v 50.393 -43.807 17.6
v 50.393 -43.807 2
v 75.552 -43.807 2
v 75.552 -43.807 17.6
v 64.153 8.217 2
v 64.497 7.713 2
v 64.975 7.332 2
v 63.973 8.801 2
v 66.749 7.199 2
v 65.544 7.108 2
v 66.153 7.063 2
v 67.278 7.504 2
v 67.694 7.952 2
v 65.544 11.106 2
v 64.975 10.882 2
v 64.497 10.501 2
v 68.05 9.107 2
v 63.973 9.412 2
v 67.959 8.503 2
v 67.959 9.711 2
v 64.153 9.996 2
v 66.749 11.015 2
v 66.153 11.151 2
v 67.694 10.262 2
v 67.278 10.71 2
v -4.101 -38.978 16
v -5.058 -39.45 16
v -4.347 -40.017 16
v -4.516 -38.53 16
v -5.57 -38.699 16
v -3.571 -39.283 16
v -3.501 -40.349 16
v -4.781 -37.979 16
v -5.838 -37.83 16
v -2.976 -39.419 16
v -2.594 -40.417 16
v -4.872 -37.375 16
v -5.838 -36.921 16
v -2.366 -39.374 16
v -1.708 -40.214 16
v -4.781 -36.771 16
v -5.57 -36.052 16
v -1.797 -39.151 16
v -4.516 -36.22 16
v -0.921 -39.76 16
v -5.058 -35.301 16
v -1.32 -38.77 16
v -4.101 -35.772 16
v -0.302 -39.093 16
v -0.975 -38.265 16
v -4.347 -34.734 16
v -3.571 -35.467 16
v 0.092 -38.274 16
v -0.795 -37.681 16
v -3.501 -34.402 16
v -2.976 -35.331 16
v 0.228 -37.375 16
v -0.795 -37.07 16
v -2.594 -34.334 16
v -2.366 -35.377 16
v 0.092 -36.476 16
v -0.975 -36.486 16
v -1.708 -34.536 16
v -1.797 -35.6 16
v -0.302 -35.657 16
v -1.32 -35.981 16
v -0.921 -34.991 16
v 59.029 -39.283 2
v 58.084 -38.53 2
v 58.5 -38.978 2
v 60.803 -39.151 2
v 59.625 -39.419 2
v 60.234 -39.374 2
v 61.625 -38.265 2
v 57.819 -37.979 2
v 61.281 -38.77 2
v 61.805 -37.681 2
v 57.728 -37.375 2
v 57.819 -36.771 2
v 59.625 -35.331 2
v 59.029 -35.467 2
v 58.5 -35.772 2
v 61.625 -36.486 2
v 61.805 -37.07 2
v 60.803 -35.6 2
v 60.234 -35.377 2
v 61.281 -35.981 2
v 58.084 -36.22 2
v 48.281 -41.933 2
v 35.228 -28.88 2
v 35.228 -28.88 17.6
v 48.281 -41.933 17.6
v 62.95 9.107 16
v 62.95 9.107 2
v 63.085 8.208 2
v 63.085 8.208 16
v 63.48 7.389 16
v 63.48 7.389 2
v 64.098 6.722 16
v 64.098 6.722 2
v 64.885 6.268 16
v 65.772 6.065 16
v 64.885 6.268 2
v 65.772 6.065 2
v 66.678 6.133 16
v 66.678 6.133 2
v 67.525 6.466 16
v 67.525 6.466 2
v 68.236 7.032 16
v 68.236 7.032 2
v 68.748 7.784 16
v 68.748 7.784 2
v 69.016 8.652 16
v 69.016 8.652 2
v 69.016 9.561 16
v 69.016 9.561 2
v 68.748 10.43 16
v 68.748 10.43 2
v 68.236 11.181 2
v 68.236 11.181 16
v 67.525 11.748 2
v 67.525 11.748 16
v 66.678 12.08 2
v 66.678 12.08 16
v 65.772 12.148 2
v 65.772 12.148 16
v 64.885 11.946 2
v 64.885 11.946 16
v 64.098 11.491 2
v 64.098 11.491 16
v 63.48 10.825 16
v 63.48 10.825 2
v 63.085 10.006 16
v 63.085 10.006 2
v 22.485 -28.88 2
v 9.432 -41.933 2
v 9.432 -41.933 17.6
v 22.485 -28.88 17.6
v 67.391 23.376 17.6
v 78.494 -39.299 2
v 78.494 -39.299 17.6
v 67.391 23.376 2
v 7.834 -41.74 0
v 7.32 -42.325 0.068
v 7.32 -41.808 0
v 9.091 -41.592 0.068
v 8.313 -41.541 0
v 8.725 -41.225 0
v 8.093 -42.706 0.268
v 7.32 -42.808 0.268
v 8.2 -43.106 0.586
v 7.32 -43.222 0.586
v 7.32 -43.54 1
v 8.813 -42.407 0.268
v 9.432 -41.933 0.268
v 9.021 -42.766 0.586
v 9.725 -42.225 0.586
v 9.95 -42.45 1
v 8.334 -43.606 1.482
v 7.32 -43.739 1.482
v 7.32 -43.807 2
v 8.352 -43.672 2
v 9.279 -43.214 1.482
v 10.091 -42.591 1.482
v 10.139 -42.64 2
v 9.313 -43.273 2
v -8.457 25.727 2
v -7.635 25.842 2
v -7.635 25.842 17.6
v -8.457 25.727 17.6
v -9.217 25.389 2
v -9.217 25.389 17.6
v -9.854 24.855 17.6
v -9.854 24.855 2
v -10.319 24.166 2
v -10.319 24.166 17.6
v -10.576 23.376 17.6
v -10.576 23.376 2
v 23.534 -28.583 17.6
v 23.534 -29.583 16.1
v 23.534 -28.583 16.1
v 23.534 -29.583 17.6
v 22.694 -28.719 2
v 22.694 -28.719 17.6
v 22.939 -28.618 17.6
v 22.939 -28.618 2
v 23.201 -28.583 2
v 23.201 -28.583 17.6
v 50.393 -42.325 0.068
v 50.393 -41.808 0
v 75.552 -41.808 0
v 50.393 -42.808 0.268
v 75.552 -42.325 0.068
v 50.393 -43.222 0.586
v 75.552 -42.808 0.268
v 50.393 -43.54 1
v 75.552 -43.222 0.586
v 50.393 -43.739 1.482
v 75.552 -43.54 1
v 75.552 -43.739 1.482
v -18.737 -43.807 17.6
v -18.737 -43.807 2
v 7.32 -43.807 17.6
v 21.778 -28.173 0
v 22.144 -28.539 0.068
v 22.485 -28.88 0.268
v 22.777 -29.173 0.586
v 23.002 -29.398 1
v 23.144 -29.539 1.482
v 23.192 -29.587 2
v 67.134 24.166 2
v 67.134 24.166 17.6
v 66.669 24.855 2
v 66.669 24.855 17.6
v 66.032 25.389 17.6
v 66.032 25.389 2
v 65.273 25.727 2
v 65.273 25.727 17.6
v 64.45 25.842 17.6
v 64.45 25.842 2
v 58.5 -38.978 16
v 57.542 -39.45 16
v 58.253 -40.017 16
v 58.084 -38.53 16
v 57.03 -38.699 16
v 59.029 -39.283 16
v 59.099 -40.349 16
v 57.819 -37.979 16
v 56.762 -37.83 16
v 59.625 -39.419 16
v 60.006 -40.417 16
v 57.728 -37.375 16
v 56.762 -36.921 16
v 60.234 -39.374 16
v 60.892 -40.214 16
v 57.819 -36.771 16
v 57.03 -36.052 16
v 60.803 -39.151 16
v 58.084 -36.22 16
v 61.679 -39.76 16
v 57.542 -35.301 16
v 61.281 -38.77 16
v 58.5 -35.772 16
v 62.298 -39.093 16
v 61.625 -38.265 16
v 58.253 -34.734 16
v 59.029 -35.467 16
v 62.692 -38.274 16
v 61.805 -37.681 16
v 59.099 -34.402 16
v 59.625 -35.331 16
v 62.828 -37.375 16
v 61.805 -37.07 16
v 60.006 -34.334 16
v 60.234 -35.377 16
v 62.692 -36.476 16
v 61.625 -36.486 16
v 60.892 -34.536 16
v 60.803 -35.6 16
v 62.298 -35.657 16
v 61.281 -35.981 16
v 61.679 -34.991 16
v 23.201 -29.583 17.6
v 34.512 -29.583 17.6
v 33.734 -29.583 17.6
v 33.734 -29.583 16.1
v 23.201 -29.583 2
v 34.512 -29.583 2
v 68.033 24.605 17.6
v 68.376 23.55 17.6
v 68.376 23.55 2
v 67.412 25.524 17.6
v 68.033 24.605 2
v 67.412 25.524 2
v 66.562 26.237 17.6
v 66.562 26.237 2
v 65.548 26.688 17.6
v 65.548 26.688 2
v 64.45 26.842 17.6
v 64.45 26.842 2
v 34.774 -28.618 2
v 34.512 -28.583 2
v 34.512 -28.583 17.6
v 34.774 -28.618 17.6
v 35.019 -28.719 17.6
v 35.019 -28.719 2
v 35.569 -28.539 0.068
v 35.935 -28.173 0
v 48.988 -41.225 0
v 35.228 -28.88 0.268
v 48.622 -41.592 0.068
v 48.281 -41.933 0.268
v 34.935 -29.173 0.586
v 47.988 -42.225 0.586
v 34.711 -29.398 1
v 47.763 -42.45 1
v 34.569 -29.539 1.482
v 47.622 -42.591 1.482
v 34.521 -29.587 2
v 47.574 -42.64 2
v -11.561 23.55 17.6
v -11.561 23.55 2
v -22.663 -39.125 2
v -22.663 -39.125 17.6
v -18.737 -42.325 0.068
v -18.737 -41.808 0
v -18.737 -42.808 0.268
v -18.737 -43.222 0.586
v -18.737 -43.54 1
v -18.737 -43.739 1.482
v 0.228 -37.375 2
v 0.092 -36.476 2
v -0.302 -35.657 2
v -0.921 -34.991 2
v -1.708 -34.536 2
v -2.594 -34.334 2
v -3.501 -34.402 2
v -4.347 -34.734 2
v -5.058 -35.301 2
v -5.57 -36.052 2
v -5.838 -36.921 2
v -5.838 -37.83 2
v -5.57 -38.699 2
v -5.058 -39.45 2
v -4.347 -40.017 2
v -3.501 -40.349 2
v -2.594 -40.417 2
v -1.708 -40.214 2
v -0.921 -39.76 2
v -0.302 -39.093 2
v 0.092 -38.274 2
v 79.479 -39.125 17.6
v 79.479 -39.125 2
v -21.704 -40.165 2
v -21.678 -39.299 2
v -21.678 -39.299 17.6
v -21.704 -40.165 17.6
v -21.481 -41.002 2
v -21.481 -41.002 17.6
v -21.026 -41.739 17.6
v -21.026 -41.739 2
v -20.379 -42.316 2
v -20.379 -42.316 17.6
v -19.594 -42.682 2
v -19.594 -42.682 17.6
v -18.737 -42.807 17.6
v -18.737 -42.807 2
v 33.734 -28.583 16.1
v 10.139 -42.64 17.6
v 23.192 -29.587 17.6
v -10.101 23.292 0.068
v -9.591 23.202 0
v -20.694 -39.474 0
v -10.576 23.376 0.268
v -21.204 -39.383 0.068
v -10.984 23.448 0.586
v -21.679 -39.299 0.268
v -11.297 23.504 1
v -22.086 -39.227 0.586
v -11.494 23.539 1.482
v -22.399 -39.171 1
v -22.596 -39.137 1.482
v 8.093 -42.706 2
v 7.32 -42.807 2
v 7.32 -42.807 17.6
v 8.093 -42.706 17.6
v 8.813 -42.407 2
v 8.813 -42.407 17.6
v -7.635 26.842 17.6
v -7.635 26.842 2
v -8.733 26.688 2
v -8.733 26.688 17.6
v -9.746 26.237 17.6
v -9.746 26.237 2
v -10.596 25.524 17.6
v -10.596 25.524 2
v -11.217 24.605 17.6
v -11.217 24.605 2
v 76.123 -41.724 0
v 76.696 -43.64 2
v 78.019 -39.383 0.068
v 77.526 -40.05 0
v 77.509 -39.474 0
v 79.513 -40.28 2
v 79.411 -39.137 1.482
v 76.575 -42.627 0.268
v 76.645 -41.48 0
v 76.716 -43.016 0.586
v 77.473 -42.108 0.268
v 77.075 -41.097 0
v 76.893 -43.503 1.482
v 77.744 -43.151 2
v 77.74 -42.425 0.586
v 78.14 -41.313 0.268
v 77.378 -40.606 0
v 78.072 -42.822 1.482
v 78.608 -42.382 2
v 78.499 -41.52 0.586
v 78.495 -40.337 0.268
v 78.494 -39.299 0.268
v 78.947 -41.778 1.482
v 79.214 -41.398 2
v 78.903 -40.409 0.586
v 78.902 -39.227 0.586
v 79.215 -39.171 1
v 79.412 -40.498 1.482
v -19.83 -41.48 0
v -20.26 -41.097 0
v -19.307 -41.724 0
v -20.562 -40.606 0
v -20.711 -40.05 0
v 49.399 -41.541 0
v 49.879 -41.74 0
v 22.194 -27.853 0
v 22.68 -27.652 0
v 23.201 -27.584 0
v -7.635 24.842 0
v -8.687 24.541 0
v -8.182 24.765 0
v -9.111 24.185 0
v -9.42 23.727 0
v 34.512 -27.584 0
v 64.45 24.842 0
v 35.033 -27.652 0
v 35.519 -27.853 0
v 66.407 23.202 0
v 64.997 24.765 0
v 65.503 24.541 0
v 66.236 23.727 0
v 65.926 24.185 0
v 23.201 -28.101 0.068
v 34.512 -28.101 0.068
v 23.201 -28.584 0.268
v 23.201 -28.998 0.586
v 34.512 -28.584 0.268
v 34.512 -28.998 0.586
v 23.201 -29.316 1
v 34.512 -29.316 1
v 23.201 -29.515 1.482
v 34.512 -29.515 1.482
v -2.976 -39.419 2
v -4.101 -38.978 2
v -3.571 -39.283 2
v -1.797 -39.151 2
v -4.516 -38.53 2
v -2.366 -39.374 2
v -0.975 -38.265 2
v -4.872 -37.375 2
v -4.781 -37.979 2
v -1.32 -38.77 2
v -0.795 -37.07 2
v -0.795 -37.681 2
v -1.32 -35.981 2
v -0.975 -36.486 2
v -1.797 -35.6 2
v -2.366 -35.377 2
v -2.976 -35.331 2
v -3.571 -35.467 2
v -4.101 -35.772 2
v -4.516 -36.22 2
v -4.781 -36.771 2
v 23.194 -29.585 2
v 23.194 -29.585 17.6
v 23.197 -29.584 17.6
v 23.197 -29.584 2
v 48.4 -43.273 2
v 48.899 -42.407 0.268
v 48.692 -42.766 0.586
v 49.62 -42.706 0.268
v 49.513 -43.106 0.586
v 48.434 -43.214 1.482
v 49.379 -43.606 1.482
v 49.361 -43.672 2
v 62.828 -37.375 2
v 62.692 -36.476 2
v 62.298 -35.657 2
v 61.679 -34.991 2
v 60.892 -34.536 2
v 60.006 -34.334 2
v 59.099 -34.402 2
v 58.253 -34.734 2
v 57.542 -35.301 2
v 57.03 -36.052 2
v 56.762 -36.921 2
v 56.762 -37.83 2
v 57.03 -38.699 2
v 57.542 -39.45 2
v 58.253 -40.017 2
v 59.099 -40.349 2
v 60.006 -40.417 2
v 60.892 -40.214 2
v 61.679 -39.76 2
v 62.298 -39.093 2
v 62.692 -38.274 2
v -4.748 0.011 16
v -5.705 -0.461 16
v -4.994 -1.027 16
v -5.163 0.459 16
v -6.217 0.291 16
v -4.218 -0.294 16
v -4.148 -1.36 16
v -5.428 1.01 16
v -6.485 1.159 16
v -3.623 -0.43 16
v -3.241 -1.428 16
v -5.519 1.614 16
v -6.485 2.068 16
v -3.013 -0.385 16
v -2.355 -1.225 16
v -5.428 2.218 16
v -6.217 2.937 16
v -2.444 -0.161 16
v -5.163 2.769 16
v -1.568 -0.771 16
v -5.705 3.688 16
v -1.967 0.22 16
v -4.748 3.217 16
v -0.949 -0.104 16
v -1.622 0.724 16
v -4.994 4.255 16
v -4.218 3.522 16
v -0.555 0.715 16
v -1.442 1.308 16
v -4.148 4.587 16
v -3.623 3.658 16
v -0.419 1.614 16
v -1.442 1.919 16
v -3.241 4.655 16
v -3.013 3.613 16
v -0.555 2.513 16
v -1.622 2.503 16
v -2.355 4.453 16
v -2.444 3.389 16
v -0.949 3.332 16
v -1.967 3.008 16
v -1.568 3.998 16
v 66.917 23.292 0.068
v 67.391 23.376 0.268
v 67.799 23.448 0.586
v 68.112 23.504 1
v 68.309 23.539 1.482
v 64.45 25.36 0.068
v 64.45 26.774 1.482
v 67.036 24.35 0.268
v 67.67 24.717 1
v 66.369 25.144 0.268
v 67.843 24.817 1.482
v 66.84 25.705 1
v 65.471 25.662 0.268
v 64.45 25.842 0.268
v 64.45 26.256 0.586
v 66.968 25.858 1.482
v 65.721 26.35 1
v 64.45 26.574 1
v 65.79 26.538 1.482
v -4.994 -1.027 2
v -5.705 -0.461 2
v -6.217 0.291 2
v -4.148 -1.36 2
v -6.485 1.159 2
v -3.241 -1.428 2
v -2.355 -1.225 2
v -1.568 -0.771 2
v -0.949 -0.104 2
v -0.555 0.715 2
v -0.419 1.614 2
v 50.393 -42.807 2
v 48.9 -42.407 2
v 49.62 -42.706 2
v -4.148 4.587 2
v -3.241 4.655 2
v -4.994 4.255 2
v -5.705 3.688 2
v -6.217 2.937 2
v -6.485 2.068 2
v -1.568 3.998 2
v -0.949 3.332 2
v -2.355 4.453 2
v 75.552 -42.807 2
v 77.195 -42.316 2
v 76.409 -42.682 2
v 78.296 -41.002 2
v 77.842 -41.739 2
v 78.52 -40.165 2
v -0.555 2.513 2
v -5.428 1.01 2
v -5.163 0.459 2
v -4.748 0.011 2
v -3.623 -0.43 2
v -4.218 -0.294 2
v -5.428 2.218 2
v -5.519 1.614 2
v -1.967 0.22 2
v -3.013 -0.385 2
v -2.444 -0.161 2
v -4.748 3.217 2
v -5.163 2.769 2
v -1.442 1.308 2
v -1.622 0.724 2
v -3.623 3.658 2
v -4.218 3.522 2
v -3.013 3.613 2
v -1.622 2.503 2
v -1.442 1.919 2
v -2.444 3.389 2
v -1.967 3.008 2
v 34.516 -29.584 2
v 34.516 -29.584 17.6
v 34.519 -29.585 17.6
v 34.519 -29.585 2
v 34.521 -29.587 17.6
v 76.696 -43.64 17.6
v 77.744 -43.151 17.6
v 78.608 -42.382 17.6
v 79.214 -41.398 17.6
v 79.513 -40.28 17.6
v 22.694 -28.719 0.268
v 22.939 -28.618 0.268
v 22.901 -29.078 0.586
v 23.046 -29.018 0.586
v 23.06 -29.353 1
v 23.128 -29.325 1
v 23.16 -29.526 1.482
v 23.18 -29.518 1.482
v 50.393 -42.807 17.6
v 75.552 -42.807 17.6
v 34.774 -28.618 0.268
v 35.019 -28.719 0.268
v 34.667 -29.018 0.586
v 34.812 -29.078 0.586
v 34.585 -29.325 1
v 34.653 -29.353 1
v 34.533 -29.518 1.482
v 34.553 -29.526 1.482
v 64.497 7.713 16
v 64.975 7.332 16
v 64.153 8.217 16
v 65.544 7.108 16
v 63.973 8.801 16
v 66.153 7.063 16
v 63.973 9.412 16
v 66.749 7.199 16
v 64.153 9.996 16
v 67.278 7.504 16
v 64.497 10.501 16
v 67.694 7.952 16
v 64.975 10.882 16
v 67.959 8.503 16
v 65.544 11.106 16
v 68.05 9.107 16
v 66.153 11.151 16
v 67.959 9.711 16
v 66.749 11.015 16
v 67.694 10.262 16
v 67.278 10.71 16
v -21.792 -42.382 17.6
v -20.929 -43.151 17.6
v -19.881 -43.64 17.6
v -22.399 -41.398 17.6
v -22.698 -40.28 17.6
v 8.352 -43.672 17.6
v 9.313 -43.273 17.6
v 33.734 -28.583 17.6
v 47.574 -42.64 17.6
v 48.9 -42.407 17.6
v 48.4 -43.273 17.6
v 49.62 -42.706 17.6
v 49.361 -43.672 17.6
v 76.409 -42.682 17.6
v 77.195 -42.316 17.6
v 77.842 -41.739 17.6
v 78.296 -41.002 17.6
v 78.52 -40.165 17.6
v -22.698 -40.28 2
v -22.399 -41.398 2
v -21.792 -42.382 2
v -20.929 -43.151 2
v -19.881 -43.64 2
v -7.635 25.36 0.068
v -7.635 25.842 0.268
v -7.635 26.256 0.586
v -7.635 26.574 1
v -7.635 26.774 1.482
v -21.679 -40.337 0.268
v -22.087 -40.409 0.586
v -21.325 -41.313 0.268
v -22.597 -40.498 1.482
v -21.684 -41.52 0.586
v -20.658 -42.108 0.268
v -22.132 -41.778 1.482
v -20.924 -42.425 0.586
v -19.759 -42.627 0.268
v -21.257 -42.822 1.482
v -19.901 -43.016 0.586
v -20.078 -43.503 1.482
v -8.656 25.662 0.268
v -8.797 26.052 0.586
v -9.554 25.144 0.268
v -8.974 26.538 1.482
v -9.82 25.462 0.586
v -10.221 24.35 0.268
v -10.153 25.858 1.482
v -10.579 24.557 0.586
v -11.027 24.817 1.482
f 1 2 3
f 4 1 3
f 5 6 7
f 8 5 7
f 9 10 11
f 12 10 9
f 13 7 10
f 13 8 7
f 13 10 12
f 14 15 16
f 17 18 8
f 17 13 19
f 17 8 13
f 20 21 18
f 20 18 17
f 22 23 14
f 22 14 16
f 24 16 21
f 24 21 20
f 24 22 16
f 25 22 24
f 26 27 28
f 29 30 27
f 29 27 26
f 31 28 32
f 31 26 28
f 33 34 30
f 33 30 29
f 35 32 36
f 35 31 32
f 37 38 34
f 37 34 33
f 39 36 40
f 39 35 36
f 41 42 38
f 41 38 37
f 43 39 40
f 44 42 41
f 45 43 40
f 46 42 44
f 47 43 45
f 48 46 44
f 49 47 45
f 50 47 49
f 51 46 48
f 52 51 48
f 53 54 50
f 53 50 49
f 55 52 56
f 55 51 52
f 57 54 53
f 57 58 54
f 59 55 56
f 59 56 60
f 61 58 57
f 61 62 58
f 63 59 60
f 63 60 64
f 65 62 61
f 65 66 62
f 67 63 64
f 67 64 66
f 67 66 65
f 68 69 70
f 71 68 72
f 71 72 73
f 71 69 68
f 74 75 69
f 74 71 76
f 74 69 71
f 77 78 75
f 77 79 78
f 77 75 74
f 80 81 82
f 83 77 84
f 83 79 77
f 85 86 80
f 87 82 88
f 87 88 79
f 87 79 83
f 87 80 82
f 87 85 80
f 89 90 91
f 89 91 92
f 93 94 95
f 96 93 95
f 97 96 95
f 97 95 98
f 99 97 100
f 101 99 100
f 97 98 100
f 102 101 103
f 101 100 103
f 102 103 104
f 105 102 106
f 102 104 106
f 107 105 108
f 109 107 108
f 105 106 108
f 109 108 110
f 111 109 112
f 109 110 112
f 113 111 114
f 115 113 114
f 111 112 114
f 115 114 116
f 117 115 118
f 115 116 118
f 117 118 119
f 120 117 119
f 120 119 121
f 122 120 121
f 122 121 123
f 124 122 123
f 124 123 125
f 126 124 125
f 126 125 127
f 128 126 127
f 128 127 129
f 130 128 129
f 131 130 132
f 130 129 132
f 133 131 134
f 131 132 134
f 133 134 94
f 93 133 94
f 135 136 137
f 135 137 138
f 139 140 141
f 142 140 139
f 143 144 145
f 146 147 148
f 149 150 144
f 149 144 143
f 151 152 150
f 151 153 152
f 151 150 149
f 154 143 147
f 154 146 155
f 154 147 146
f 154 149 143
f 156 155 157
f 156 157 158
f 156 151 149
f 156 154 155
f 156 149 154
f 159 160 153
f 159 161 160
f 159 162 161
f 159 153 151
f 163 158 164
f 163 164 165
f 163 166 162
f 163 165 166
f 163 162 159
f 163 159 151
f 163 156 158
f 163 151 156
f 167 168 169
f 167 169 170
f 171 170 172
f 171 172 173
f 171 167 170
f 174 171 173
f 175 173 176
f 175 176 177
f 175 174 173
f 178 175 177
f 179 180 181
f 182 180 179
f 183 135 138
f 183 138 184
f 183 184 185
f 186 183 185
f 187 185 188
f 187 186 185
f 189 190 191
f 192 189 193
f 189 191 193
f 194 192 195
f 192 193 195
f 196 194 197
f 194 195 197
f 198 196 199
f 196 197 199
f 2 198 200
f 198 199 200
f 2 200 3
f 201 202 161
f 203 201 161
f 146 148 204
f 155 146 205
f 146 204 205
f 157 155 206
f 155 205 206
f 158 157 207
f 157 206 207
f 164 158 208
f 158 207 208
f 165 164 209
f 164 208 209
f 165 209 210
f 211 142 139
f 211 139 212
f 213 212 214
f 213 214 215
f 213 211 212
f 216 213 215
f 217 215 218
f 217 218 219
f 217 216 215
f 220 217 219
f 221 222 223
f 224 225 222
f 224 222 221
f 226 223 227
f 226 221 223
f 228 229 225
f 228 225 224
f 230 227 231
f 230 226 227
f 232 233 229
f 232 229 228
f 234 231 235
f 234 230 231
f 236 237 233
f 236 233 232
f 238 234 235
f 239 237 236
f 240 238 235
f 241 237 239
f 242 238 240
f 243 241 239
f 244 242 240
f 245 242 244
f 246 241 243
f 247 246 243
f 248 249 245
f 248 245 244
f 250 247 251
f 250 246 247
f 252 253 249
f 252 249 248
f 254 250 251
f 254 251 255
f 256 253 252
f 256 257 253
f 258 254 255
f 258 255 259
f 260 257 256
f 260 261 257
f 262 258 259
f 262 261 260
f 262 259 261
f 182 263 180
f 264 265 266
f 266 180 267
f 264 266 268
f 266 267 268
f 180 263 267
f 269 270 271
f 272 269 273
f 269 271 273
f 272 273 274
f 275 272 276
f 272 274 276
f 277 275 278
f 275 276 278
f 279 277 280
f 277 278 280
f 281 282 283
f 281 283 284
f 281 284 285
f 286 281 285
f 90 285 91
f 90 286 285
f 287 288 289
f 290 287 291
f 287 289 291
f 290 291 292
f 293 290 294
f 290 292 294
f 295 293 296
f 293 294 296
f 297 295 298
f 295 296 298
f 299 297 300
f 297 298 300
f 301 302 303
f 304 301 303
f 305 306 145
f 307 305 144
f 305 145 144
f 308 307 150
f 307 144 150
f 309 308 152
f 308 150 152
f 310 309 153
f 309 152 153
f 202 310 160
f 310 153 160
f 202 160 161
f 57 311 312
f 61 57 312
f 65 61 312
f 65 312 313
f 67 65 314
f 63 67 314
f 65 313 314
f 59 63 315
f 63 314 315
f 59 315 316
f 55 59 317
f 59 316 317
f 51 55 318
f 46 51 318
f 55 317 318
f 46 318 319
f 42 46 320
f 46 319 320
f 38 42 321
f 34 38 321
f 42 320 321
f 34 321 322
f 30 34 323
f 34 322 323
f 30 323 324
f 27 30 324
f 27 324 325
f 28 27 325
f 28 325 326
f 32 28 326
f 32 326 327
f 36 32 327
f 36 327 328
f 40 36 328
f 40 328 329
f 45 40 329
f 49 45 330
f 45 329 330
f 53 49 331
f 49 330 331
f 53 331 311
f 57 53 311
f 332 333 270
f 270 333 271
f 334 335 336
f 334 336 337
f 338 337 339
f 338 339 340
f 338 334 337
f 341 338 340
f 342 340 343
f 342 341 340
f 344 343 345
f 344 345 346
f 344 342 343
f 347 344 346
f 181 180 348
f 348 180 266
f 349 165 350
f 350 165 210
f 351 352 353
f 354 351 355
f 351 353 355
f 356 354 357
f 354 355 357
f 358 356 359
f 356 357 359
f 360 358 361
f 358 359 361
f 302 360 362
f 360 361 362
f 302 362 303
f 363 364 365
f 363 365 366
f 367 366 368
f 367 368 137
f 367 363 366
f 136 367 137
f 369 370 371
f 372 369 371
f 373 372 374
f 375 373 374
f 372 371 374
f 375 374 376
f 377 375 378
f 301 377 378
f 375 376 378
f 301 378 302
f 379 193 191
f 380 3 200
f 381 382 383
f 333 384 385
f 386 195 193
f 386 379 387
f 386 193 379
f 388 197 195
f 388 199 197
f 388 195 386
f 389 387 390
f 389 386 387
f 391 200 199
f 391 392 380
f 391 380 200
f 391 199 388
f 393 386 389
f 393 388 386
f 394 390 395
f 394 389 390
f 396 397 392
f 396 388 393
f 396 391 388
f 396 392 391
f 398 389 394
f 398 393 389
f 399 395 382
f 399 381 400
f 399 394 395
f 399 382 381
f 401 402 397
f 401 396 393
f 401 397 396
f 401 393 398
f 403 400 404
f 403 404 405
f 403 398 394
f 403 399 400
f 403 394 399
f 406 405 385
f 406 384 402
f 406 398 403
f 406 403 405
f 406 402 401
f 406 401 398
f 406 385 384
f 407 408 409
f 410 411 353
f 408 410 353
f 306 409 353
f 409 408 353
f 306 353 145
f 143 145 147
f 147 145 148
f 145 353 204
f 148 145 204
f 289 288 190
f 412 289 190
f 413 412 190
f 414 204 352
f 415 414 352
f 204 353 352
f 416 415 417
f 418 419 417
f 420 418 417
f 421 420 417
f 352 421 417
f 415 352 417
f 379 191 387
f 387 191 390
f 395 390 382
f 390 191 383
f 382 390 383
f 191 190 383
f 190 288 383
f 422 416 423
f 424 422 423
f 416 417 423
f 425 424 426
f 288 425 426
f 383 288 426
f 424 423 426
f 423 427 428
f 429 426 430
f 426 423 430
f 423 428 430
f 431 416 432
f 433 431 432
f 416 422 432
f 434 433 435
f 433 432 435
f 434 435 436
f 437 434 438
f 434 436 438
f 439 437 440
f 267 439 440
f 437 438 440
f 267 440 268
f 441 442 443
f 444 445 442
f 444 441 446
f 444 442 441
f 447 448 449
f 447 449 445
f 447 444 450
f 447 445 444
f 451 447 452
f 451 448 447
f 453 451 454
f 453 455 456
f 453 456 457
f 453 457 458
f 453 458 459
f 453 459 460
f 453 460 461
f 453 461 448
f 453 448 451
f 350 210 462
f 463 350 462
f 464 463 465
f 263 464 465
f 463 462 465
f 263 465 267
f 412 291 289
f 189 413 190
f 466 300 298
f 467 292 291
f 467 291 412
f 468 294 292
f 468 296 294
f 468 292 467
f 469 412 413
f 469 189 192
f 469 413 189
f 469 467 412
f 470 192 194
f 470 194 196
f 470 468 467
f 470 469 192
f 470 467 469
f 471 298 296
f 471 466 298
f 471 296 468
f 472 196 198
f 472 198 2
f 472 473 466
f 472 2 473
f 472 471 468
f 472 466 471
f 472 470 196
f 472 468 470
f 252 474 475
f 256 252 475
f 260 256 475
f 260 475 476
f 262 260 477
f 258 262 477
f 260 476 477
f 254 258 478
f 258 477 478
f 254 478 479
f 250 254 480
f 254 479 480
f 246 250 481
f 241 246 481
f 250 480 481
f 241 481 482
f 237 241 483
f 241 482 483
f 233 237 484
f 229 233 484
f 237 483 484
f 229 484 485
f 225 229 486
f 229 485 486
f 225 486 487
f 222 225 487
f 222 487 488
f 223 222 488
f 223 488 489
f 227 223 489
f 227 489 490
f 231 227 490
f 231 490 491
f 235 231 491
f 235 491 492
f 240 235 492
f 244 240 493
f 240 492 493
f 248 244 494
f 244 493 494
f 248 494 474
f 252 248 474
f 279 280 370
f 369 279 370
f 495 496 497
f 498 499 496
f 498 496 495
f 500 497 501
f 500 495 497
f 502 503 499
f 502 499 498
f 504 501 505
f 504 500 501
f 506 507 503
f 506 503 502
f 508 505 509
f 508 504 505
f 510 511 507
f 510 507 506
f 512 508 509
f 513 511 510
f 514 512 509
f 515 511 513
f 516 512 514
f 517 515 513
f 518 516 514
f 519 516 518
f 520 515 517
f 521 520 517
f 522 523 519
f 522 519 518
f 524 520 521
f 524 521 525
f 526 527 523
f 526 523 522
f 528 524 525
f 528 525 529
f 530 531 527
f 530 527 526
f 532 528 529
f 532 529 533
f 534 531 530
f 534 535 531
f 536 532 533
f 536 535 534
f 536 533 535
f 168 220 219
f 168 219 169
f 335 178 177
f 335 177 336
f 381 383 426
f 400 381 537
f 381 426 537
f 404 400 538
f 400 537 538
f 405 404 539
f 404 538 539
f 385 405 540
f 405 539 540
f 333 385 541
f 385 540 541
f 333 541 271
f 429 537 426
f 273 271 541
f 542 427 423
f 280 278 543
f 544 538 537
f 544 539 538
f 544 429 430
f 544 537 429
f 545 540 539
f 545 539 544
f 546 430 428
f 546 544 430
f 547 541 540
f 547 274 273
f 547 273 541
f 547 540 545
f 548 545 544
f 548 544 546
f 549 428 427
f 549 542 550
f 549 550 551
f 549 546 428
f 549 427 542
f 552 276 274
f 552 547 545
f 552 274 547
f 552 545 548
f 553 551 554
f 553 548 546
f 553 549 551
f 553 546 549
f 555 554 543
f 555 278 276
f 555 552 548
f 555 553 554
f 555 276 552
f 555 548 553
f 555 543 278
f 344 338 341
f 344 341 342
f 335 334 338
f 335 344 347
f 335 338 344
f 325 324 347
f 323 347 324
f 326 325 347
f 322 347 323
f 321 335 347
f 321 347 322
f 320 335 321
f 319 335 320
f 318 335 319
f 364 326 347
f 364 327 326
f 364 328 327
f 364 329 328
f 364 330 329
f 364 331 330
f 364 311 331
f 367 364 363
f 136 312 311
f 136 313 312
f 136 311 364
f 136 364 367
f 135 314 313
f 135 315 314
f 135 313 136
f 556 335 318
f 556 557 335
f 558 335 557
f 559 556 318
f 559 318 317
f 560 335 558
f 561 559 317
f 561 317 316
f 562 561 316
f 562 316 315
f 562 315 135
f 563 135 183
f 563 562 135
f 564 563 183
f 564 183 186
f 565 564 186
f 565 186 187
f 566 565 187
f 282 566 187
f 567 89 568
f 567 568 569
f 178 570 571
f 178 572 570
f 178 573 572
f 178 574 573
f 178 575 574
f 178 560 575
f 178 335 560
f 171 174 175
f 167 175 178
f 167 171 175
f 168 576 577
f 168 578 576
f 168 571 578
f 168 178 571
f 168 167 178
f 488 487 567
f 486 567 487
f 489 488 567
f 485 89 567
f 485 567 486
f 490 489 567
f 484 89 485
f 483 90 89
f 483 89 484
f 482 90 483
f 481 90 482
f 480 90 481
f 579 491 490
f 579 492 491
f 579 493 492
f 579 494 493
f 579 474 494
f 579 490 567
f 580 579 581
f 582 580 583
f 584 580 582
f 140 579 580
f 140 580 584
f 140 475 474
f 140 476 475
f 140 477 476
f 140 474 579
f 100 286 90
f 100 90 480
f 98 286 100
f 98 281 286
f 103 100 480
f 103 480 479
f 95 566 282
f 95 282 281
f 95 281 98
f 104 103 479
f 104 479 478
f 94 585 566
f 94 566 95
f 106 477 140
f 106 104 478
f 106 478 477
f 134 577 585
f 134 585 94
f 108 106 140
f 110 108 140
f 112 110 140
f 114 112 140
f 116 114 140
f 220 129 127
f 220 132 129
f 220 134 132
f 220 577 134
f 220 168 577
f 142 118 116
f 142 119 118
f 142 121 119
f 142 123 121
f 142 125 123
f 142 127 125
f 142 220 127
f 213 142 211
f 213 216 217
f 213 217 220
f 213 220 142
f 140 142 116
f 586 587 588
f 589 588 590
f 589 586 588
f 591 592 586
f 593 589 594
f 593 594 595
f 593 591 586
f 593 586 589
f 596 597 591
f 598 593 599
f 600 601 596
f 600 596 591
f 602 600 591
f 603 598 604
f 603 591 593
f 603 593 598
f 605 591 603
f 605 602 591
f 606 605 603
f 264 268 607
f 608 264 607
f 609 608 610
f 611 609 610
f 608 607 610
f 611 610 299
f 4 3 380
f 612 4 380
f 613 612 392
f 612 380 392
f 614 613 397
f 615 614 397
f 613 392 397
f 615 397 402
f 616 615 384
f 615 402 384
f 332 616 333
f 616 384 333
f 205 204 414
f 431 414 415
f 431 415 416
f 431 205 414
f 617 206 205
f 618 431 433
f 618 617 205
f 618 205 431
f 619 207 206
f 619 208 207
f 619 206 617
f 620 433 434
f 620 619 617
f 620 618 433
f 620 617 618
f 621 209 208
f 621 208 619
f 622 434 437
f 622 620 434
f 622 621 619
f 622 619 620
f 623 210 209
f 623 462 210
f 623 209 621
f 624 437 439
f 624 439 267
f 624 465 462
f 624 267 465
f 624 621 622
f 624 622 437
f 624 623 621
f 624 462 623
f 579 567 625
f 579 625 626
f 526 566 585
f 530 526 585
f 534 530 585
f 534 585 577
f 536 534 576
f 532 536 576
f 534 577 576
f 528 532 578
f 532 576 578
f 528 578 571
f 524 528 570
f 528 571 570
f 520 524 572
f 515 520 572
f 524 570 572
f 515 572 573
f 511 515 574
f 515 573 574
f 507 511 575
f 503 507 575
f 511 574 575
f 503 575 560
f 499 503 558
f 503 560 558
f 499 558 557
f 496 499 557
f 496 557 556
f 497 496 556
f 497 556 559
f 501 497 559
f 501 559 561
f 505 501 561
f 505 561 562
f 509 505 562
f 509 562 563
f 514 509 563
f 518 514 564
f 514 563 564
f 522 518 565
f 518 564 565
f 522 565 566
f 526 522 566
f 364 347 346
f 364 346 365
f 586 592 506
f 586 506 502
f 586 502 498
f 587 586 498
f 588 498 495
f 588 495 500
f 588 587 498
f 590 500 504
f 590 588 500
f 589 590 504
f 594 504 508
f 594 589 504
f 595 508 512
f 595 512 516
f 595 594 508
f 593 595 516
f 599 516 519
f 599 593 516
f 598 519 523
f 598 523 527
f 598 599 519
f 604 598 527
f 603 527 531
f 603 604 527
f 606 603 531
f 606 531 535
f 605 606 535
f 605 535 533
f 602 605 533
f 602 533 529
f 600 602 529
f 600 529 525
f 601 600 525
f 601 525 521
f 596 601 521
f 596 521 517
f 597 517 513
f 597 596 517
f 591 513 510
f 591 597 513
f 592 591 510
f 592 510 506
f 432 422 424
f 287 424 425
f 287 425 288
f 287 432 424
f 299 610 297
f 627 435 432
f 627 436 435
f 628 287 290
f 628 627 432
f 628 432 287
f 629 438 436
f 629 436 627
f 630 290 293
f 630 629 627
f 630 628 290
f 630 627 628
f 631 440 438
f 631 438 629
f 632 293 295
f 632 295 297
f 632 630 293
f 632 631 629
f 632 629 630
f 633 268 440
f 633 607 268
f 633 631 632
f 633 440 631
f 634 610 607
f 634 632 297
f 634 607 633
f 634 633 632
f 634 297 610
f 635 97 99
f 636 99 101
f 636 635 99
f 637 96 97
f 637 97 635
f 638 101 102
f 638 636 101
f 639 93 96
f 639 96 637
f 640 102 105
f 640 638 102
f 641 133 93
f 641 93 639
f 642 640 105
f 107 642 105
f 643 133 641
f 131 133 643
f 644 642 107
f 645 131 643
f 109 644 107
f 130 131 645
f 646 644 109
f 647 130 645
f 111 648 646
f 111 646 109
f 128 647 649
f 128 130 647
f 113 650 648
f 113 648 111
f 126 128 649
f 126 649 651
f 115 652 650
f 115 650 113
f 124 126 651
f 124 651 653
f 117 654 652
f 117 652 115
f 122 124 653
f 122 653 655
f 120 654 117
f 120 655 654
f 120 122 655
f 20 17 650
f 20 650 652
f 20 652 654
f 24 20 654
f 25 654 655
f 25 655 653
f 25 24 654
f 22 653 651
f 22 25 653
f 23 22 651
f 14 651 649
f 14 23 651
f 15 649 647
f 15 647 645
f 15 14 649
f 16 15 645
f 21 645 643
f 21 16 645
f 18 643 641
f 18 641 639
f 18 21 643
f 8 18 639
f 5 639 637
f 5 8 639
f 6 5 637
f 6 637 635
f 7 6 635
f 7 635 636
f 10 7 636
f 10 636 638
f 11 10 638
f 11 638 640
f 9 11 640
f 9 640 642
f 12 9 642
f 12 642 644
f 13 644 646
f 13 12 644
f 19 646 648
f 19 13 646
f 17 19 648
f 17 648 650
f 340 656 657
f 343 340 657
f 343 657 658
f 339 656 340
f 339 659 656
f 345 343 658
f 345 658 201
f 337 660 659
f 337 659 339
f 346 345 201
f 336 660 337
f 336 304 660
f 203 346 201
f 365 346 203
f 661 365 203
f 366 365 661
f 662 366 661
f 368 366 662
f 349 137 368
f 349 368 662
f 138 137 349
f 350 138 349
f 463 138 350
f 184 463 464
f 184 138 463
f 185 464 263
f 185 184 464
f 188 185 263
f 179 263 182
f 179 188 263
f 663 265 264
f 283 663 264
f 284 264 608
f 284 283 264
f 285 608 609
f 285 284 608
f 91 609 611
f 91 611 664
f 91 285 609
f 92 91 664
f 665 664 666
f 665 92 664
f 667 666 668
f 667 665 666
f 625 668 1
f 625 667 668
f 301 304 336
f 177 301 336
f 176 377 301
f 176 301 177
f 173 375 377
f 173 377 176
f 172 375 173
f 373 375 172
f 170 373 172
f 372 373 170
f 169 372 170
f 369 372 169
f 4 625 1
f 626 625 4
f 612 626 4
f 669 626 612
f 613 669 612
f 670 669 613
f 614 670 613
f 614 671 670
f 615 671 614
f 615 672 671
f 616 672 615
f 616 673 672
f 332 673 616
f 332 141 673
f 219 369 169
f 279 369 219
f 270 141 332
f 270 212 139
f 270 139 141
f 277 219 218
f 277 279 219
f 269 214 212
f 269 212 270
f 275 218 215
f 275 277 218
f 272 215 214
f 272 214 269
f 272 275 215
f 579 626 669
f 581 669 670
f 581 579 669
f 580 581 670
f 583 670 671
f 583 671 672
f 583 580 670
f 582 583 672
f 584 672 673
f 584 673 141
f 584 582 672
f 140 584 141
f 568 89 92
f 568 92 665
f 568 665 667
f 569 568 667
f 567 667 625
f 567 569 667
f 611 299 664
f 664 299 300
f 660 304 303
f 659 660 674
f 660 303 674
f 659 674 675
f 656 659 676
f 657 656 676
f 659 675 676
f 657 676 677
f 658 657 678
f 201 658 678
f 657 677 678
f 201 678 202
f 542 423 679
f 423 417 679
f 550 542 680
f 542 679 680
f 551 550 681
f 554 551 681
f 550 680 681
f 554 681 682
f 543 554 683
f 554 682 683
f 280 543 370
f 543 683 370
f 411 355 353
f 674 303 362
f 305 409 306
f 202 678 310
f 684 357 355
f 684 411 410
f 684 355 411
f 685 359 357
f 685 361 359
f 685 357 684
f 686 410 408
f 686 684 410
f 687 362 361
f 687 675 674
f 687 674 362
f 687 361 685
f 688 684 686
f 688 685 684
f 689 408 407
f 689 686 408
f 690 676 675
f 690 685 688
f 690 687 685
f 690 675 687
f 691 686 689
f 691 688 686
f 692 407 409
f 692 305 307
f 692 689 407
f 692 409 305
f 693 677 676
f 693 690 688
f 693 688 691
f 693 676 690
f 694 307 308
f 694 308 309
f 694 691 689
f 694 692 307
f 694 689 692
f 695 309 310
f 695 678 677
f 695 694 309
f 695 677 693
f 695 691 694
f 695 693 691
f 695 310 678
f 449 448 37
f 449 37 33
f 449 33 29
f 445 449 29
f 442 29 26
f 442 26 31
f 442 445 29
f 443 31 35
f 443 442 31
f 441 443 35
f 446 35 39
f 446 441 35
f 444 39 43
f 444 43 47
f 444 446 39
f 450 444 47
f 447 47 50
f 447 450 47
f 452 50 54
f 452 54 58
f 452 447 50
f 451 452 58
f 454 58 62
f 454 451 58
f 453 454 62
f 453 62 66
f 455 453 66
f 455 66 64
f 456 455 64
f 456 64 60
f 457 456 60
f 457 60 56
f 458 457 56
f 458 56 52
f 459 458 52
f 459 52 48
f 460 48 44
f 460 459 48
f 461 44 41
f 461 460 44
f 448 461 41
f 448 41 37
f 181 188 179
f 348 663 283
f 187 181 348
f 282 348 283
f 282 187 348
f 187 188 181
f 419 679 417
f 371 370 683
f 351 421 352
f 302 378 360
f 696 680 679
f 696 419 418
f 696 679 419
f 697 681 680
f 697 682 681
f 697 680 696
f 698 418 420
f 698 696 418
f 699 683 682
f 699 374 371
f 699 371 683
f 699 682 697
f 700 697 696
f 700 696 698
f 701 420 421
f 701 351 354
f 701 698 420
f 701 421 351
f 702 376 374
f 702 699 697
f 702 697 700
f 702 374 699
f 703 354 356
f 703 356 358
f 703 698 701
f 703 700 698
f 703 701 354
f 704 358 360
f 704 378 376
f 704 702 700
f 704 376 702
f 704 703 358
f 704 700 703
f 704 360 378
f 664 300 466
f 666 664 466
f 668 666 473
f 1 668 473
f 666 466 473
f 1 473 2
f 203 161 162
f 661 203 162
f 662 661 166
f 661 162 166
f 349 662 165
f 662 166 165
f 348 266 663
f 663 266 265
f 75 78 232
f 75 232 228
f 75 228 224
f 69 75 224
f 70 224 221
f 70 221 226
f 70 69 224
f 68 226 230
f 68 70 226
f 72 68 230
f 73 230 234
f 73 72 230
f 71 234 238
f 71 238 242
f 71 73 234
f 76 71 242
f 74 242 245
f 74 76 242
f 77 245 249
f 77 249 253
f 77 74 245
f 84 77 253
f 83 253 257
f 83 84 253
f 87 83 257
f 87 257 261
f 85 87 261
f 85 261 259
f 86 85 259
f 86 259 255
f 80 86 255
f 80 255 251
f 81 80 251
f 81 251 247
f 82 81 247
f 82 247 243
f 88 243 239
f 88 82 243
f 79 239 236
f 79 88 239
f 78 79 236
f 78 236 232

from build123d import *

# Parameters (mm, degrees)
EXTRUDE_1_DEPTH                    = 2
EXTRUDE_2_DEPTH                    = 14
EXTRUDE_3_DEPTH                    = 15.6000508
FILLET_1_R                         = 2
SKETCH_12_W                        = 10.2
SKETCH_12_H                        = 1.9
USB_TYPEC_LOWER_HALF_OPENING_DEPTH = 4


with BuildPart() as part:
    # 草图1 → 凸台-拉伸1 (new body)
    with BuildSketch(Plane.XY):
        with BuildLine():
            Line((-18.736989068, -43.807492656), (7.319785463, -43.807492656))
            ThreePointArc((7.319785463, -43.807492656), (8.845661337, -43.503976443), (10.139236063, -42.639636403))
            Line((10.139236063, -42.639636403), (23.19168867, -29.587186336))
            ThreePointArc((23.19168867, -29.587186336), (23.195810689, -29.58443157), (23.200673199, -29.583464208))
            Line((23.200673199, -29.583464208), (34.512272144, -29.583464208))
            ThreePointArc((34.512272144, -29.583464208), (34.51713329, -29.584431533), (34.521254362, -29.587185298))
            Line((34.521254362, -29.587185298), (47.573709045, -42.639637441))
            ThreePointArc((47.573709045, -42.639637441), (48.867282822, -43.503976481), (50.393157333, -43.807492656))
            Line((50.393157333, -43.807492656), (75.552353414, -43.807492656))
            ThreePointArc((75.552353414, -43.807492656), (78.607819066, -42.38196989), (79.478533005, -39.124694535))
            Line((79.478533005, -39.124694535), (68.376081771, 23.550429382))
            ThreePointArc((68.376081771, 23.550429382), (67.011684276, 25.910401612), (64.449902577, 26.842240644))
            Line((64.449902577, 26.842240644), (-7.634537883, 26.842240644))
            ThreePointArc((-7.634537883, 26.842240644), (-10.196320099, 25.910401179), (-11.560717313, 23.550428053))
            Line((-11.560717313, 23.550428053), (-22.663168183, -39.124693813))
            ThreePointArc((-22.663168183, -39.124693813), (-21.792454719, -42.381969476), (-18.736989068, -43.807492656))
        make_face()
    extrude(amount=EXTRUDE_1_DEPTH)

    # 草图4 → 凸台-拉伸2 (add)
    # profile 1 of 4: a face of its own
    with BuildSketch(Plane.XY.offset(2)):
        with BuildLine():
            ThreePointArc((-5.872384963, -37.375183791), (-2.822381153, -40.425187601), (0.227622657, -37.375183791))
            ThreePointArc((0.227622657, -37.375183791), (-2.822381153, -34.325179981), (-5.872384963, -37.375183791))
        make_face()
        with BuildLine():
            ThreePointArc((-0.772377343, -37.375183791), (-2.822381153, -35.325179981), (-4.872384963, -37.375183791))
            ThreePointArc((-4.872384963, -37.375183791), (-2.822381153, -39.425187601), (-0.772377343, -37.375183791))
        make_face(mode=Mode.SUBTRACT)
    # profile 2 of 4: a face of its own
    with BuildSketch(Plane.XY.offset(2)):
        with BuildLine():
            ThreePointArc((56.727742037, -37.375183791), (59.777745847, -40.425187601), (62.827749657, -37.375183791))
            ThreePointArc((62.827749657, -37.375183791), (59.777745847, -34.325179981), (56.727742037, -37.375183791))
        make_face()
        with BuildLine():
            ThreePointArc((61.827749657, -37.375183791), (59.777745847, -35.325179981), (57.727742037, -37.375183791))
            ThreePointArc((57.727742037, -37.375183791), (59.777745847, -39.425187601), (61.827749657, -37.375183791))
        make_face(mode=Mode.SUBTRACT)
    # profile 3 of 4: a face of its own
    with BuildSketch(Plane.XY.offset(2)):
        with BuildLine():
            ThreePointArc((69.049761341, 9.106909173), (65.999757531, 12.156912983), (62.949753721, 9.106909173))
            ThreePointArc((62.949753721, 9.106909173), (65.999757531, 6.056905363), (69.049761341, 9.106909173))
        make_face()
        with BuildLine():
            ThreePointArc((63.949753721, 9.106909173), (65.999757531, 7.056905363), (68.049761341, 9.106909173))
            ThreePointArc((68.049761341, 9.106909173), (65.999757531, 11.156912983), (63.949753721, 9.106909173))
        make_face(mode=Mode.SUBTRACT)
    # profile 4 of 4: a face of its own
    with BuildSketch(Plane.XY.offset(2)):
        with BuildLine():
            ThreePointArc((-6.519385217, 1.613894187), (-3.469381407, -1.436109623), (-0.419377597, 1.613894187))
            ThreePointArc((-0.419377597, 1.613894187), (-3.469381407, 4.663897997), (-6.519385217, 1.613894187))
        make_face()
        with BuildLine():
            ThreePointArc((-1.419377597, 1.613894187), (-3.469381407, 3.663897997), (-5.519385217, 1.613894187))
            ThreePointArc((-5.519385217, 1.613894187), (-3.469381407, -0.436109623), (-1.419377597, 1.613894187))
        make_face(mode=Mode.SUBTRACT)
    extrude(amount=EXTRUDE_2_DEPTH)

    # 草图6 → 凸台-拉伸3 (add)
    with BuildSketch(Plane.XY.offset(2)):
        with BuildLine():
            Line((-11.560717313, 23.550428053), (-22.663168183, -39.124693813))
            ThreePointArc((-22.663168183, -39.124693813), (-21.792454719, -42.381969476), (-18.736989068, -43.807492656))
            Line((-18.736989068, -43.807492656), (7.319785463, -43.807492656))
            ThreePointArc((7.319785463, -43.807492656), (8.845661337, -43.503976443), (10.139236063, -42.639636403))
            Line((10.139236063, -42.639636403), (23.19168867, -29.587186337))
            ThreePointArc((23.19168867, -29.587186337), (23.195810689, -29.58443157), (23.200673199, -29.583464208))
            Line((23.200673199, -29.583464208), (34.512272144, -29.583464208))
            ThreePointArc((34.512272144, -29.583464208), (34.51713329, -29.584431533), (34.521254362, -29.587185298))
            Line((34.521254362, -29.587185298), (47.573709045, -42.639637441))
            ThreePointArc((47.573709045, -42.639637441), (48.867282822, -43.503976481), (50.393157333, -43.807492656))
            Line((50.393157333, -43.807492656), (75.552353414, -43.807492656))
            ThreePointArc((75.552353414, -43.807492656), (78.607819066, -42.38196989), (79.478533005, -39.124694535))
            Line((79.478533005, -39.124694535), (68.376081771, 23.550429382))
            ThreePointArc((68.376081771, 23.550429382), (67.011684276, 25.910401612), (64.449902577, 26.842240644))
            Line((64.449902577, 26.842240644), (-7.634537883, 26.842240644))
            ThreePointArc((-7.634537883, 26.842240644), (-10.196320099, 25.910401179), (-11.560717313, 23.550428053))
        make_face()
        with BuildLine():
            Line((-10.576047254, 23.376000774), (-21.678498124, -39.299121091))
            ThreePointArc((-21.678498124, -39.299121091), (-21.026156001, -41.739485021), (-18.736988894, -42.807492656))
            Line((-18.736988894, -42.807492656), (7.319785463, -42.807492656))
            ThreePointArc((7.319785463, -42.807492656), (8.462977611, -42.580097033), (9.432128831, -41.932530072))
            Line((9.432128831, -41.932530072), (22.484540842, -28.880120606))
            ThreePointArc((22.484540842, -28.880120606), (22.813100147, -28.660563268), (23.200672562, -28.583464208))
            Line((23.200672562, -28.583464208), (34.512322586, -28.58346421))
            ThreePointArc((34.512322586, -28.58346421), (34.899840317, -28.660561774), (35.228361593, -28.880078967))
            Line((35.228361593, -28.880078967), (48.280815757, -41.932530591))
            ThreePointArc((48.280815757, -41.932530591), (49.249966503, -42.580097051), (50.393157969, -42.807492656))
            Line((50.393157969, -42.807492656), (75.552353414, -42.807492656))
            ThreePointArc((75.552353414, -42.807492656), (77.841520522, -41.739485228), (78.493862882, -39.299121453))
            Line((78.493862882, -39.299121453), (67.391411713, 23.376002103))
            ThreePointArc((67.391411713, 23.376002103), (66.369199703, 25.144102993), (64.449902443, 25.842240644))
            Line((64.449902443, 25.842240644), (-7.634537883, 25.842240644))
            ThreePointArc((-7.634537883, 25.842240644), (-9.553835577, 25.144102517), (-10.576047254, 23.376000774))
        make_face(mode=Mode.SUBTRACT)
    extrude(amount=EXTRUDE_3_DEPTH)

    # 圆角1
    fillet_1_edges = [part.edges().sort_by_distance(p)[0] for p in [
        (28.407682347, 26.842240644, 0),
        (67.011684276, 25.910401612, 0),
        (73.927307388, -7.787132577, 0),
        (78.607819066, -42.38196989, 0),
        (62.972755373, -43.807492656, 0),
        (48.867282822, -43.503976481, 0),
        (41.047481703, -36.11341137, 0),
        (34.51713329, -29.584431533, 0),
        (28.856472671, -29.583464208, 0),
        (23.195810689, -29.58443157, 0),
        (16.665462366, -36.11341137, 0),
        (8.845661337, -43.503976443, 0),
        (-5.708601803, -43.807492656, 0),
        (-21.792454719, -42.381969476, 0),
        (-17.111942748, -7.78713288, 0),
        (-10.196320099, 25.910401179, 0),
    ]]
    fillet(fillet_1_edges, radius=FILLET_1_R - 0.0001)  # a hair under: the kernel refuses the full size

    # 草图12 → USB_TypeC_Lower_Half_Opening (cut)
    with BuildSketch(Plane.XZ.offset(29.583464208)):
        with Locations((28.634, 17.05)):
            Rectangle(SKETCH_12_W, SKETCH_12_H)
    extrude(amount=-USB_TYPEC_LOWER_HALF_OPENING_DEPTH, mode=Mode.SUBTRACT)


solid = part.part
